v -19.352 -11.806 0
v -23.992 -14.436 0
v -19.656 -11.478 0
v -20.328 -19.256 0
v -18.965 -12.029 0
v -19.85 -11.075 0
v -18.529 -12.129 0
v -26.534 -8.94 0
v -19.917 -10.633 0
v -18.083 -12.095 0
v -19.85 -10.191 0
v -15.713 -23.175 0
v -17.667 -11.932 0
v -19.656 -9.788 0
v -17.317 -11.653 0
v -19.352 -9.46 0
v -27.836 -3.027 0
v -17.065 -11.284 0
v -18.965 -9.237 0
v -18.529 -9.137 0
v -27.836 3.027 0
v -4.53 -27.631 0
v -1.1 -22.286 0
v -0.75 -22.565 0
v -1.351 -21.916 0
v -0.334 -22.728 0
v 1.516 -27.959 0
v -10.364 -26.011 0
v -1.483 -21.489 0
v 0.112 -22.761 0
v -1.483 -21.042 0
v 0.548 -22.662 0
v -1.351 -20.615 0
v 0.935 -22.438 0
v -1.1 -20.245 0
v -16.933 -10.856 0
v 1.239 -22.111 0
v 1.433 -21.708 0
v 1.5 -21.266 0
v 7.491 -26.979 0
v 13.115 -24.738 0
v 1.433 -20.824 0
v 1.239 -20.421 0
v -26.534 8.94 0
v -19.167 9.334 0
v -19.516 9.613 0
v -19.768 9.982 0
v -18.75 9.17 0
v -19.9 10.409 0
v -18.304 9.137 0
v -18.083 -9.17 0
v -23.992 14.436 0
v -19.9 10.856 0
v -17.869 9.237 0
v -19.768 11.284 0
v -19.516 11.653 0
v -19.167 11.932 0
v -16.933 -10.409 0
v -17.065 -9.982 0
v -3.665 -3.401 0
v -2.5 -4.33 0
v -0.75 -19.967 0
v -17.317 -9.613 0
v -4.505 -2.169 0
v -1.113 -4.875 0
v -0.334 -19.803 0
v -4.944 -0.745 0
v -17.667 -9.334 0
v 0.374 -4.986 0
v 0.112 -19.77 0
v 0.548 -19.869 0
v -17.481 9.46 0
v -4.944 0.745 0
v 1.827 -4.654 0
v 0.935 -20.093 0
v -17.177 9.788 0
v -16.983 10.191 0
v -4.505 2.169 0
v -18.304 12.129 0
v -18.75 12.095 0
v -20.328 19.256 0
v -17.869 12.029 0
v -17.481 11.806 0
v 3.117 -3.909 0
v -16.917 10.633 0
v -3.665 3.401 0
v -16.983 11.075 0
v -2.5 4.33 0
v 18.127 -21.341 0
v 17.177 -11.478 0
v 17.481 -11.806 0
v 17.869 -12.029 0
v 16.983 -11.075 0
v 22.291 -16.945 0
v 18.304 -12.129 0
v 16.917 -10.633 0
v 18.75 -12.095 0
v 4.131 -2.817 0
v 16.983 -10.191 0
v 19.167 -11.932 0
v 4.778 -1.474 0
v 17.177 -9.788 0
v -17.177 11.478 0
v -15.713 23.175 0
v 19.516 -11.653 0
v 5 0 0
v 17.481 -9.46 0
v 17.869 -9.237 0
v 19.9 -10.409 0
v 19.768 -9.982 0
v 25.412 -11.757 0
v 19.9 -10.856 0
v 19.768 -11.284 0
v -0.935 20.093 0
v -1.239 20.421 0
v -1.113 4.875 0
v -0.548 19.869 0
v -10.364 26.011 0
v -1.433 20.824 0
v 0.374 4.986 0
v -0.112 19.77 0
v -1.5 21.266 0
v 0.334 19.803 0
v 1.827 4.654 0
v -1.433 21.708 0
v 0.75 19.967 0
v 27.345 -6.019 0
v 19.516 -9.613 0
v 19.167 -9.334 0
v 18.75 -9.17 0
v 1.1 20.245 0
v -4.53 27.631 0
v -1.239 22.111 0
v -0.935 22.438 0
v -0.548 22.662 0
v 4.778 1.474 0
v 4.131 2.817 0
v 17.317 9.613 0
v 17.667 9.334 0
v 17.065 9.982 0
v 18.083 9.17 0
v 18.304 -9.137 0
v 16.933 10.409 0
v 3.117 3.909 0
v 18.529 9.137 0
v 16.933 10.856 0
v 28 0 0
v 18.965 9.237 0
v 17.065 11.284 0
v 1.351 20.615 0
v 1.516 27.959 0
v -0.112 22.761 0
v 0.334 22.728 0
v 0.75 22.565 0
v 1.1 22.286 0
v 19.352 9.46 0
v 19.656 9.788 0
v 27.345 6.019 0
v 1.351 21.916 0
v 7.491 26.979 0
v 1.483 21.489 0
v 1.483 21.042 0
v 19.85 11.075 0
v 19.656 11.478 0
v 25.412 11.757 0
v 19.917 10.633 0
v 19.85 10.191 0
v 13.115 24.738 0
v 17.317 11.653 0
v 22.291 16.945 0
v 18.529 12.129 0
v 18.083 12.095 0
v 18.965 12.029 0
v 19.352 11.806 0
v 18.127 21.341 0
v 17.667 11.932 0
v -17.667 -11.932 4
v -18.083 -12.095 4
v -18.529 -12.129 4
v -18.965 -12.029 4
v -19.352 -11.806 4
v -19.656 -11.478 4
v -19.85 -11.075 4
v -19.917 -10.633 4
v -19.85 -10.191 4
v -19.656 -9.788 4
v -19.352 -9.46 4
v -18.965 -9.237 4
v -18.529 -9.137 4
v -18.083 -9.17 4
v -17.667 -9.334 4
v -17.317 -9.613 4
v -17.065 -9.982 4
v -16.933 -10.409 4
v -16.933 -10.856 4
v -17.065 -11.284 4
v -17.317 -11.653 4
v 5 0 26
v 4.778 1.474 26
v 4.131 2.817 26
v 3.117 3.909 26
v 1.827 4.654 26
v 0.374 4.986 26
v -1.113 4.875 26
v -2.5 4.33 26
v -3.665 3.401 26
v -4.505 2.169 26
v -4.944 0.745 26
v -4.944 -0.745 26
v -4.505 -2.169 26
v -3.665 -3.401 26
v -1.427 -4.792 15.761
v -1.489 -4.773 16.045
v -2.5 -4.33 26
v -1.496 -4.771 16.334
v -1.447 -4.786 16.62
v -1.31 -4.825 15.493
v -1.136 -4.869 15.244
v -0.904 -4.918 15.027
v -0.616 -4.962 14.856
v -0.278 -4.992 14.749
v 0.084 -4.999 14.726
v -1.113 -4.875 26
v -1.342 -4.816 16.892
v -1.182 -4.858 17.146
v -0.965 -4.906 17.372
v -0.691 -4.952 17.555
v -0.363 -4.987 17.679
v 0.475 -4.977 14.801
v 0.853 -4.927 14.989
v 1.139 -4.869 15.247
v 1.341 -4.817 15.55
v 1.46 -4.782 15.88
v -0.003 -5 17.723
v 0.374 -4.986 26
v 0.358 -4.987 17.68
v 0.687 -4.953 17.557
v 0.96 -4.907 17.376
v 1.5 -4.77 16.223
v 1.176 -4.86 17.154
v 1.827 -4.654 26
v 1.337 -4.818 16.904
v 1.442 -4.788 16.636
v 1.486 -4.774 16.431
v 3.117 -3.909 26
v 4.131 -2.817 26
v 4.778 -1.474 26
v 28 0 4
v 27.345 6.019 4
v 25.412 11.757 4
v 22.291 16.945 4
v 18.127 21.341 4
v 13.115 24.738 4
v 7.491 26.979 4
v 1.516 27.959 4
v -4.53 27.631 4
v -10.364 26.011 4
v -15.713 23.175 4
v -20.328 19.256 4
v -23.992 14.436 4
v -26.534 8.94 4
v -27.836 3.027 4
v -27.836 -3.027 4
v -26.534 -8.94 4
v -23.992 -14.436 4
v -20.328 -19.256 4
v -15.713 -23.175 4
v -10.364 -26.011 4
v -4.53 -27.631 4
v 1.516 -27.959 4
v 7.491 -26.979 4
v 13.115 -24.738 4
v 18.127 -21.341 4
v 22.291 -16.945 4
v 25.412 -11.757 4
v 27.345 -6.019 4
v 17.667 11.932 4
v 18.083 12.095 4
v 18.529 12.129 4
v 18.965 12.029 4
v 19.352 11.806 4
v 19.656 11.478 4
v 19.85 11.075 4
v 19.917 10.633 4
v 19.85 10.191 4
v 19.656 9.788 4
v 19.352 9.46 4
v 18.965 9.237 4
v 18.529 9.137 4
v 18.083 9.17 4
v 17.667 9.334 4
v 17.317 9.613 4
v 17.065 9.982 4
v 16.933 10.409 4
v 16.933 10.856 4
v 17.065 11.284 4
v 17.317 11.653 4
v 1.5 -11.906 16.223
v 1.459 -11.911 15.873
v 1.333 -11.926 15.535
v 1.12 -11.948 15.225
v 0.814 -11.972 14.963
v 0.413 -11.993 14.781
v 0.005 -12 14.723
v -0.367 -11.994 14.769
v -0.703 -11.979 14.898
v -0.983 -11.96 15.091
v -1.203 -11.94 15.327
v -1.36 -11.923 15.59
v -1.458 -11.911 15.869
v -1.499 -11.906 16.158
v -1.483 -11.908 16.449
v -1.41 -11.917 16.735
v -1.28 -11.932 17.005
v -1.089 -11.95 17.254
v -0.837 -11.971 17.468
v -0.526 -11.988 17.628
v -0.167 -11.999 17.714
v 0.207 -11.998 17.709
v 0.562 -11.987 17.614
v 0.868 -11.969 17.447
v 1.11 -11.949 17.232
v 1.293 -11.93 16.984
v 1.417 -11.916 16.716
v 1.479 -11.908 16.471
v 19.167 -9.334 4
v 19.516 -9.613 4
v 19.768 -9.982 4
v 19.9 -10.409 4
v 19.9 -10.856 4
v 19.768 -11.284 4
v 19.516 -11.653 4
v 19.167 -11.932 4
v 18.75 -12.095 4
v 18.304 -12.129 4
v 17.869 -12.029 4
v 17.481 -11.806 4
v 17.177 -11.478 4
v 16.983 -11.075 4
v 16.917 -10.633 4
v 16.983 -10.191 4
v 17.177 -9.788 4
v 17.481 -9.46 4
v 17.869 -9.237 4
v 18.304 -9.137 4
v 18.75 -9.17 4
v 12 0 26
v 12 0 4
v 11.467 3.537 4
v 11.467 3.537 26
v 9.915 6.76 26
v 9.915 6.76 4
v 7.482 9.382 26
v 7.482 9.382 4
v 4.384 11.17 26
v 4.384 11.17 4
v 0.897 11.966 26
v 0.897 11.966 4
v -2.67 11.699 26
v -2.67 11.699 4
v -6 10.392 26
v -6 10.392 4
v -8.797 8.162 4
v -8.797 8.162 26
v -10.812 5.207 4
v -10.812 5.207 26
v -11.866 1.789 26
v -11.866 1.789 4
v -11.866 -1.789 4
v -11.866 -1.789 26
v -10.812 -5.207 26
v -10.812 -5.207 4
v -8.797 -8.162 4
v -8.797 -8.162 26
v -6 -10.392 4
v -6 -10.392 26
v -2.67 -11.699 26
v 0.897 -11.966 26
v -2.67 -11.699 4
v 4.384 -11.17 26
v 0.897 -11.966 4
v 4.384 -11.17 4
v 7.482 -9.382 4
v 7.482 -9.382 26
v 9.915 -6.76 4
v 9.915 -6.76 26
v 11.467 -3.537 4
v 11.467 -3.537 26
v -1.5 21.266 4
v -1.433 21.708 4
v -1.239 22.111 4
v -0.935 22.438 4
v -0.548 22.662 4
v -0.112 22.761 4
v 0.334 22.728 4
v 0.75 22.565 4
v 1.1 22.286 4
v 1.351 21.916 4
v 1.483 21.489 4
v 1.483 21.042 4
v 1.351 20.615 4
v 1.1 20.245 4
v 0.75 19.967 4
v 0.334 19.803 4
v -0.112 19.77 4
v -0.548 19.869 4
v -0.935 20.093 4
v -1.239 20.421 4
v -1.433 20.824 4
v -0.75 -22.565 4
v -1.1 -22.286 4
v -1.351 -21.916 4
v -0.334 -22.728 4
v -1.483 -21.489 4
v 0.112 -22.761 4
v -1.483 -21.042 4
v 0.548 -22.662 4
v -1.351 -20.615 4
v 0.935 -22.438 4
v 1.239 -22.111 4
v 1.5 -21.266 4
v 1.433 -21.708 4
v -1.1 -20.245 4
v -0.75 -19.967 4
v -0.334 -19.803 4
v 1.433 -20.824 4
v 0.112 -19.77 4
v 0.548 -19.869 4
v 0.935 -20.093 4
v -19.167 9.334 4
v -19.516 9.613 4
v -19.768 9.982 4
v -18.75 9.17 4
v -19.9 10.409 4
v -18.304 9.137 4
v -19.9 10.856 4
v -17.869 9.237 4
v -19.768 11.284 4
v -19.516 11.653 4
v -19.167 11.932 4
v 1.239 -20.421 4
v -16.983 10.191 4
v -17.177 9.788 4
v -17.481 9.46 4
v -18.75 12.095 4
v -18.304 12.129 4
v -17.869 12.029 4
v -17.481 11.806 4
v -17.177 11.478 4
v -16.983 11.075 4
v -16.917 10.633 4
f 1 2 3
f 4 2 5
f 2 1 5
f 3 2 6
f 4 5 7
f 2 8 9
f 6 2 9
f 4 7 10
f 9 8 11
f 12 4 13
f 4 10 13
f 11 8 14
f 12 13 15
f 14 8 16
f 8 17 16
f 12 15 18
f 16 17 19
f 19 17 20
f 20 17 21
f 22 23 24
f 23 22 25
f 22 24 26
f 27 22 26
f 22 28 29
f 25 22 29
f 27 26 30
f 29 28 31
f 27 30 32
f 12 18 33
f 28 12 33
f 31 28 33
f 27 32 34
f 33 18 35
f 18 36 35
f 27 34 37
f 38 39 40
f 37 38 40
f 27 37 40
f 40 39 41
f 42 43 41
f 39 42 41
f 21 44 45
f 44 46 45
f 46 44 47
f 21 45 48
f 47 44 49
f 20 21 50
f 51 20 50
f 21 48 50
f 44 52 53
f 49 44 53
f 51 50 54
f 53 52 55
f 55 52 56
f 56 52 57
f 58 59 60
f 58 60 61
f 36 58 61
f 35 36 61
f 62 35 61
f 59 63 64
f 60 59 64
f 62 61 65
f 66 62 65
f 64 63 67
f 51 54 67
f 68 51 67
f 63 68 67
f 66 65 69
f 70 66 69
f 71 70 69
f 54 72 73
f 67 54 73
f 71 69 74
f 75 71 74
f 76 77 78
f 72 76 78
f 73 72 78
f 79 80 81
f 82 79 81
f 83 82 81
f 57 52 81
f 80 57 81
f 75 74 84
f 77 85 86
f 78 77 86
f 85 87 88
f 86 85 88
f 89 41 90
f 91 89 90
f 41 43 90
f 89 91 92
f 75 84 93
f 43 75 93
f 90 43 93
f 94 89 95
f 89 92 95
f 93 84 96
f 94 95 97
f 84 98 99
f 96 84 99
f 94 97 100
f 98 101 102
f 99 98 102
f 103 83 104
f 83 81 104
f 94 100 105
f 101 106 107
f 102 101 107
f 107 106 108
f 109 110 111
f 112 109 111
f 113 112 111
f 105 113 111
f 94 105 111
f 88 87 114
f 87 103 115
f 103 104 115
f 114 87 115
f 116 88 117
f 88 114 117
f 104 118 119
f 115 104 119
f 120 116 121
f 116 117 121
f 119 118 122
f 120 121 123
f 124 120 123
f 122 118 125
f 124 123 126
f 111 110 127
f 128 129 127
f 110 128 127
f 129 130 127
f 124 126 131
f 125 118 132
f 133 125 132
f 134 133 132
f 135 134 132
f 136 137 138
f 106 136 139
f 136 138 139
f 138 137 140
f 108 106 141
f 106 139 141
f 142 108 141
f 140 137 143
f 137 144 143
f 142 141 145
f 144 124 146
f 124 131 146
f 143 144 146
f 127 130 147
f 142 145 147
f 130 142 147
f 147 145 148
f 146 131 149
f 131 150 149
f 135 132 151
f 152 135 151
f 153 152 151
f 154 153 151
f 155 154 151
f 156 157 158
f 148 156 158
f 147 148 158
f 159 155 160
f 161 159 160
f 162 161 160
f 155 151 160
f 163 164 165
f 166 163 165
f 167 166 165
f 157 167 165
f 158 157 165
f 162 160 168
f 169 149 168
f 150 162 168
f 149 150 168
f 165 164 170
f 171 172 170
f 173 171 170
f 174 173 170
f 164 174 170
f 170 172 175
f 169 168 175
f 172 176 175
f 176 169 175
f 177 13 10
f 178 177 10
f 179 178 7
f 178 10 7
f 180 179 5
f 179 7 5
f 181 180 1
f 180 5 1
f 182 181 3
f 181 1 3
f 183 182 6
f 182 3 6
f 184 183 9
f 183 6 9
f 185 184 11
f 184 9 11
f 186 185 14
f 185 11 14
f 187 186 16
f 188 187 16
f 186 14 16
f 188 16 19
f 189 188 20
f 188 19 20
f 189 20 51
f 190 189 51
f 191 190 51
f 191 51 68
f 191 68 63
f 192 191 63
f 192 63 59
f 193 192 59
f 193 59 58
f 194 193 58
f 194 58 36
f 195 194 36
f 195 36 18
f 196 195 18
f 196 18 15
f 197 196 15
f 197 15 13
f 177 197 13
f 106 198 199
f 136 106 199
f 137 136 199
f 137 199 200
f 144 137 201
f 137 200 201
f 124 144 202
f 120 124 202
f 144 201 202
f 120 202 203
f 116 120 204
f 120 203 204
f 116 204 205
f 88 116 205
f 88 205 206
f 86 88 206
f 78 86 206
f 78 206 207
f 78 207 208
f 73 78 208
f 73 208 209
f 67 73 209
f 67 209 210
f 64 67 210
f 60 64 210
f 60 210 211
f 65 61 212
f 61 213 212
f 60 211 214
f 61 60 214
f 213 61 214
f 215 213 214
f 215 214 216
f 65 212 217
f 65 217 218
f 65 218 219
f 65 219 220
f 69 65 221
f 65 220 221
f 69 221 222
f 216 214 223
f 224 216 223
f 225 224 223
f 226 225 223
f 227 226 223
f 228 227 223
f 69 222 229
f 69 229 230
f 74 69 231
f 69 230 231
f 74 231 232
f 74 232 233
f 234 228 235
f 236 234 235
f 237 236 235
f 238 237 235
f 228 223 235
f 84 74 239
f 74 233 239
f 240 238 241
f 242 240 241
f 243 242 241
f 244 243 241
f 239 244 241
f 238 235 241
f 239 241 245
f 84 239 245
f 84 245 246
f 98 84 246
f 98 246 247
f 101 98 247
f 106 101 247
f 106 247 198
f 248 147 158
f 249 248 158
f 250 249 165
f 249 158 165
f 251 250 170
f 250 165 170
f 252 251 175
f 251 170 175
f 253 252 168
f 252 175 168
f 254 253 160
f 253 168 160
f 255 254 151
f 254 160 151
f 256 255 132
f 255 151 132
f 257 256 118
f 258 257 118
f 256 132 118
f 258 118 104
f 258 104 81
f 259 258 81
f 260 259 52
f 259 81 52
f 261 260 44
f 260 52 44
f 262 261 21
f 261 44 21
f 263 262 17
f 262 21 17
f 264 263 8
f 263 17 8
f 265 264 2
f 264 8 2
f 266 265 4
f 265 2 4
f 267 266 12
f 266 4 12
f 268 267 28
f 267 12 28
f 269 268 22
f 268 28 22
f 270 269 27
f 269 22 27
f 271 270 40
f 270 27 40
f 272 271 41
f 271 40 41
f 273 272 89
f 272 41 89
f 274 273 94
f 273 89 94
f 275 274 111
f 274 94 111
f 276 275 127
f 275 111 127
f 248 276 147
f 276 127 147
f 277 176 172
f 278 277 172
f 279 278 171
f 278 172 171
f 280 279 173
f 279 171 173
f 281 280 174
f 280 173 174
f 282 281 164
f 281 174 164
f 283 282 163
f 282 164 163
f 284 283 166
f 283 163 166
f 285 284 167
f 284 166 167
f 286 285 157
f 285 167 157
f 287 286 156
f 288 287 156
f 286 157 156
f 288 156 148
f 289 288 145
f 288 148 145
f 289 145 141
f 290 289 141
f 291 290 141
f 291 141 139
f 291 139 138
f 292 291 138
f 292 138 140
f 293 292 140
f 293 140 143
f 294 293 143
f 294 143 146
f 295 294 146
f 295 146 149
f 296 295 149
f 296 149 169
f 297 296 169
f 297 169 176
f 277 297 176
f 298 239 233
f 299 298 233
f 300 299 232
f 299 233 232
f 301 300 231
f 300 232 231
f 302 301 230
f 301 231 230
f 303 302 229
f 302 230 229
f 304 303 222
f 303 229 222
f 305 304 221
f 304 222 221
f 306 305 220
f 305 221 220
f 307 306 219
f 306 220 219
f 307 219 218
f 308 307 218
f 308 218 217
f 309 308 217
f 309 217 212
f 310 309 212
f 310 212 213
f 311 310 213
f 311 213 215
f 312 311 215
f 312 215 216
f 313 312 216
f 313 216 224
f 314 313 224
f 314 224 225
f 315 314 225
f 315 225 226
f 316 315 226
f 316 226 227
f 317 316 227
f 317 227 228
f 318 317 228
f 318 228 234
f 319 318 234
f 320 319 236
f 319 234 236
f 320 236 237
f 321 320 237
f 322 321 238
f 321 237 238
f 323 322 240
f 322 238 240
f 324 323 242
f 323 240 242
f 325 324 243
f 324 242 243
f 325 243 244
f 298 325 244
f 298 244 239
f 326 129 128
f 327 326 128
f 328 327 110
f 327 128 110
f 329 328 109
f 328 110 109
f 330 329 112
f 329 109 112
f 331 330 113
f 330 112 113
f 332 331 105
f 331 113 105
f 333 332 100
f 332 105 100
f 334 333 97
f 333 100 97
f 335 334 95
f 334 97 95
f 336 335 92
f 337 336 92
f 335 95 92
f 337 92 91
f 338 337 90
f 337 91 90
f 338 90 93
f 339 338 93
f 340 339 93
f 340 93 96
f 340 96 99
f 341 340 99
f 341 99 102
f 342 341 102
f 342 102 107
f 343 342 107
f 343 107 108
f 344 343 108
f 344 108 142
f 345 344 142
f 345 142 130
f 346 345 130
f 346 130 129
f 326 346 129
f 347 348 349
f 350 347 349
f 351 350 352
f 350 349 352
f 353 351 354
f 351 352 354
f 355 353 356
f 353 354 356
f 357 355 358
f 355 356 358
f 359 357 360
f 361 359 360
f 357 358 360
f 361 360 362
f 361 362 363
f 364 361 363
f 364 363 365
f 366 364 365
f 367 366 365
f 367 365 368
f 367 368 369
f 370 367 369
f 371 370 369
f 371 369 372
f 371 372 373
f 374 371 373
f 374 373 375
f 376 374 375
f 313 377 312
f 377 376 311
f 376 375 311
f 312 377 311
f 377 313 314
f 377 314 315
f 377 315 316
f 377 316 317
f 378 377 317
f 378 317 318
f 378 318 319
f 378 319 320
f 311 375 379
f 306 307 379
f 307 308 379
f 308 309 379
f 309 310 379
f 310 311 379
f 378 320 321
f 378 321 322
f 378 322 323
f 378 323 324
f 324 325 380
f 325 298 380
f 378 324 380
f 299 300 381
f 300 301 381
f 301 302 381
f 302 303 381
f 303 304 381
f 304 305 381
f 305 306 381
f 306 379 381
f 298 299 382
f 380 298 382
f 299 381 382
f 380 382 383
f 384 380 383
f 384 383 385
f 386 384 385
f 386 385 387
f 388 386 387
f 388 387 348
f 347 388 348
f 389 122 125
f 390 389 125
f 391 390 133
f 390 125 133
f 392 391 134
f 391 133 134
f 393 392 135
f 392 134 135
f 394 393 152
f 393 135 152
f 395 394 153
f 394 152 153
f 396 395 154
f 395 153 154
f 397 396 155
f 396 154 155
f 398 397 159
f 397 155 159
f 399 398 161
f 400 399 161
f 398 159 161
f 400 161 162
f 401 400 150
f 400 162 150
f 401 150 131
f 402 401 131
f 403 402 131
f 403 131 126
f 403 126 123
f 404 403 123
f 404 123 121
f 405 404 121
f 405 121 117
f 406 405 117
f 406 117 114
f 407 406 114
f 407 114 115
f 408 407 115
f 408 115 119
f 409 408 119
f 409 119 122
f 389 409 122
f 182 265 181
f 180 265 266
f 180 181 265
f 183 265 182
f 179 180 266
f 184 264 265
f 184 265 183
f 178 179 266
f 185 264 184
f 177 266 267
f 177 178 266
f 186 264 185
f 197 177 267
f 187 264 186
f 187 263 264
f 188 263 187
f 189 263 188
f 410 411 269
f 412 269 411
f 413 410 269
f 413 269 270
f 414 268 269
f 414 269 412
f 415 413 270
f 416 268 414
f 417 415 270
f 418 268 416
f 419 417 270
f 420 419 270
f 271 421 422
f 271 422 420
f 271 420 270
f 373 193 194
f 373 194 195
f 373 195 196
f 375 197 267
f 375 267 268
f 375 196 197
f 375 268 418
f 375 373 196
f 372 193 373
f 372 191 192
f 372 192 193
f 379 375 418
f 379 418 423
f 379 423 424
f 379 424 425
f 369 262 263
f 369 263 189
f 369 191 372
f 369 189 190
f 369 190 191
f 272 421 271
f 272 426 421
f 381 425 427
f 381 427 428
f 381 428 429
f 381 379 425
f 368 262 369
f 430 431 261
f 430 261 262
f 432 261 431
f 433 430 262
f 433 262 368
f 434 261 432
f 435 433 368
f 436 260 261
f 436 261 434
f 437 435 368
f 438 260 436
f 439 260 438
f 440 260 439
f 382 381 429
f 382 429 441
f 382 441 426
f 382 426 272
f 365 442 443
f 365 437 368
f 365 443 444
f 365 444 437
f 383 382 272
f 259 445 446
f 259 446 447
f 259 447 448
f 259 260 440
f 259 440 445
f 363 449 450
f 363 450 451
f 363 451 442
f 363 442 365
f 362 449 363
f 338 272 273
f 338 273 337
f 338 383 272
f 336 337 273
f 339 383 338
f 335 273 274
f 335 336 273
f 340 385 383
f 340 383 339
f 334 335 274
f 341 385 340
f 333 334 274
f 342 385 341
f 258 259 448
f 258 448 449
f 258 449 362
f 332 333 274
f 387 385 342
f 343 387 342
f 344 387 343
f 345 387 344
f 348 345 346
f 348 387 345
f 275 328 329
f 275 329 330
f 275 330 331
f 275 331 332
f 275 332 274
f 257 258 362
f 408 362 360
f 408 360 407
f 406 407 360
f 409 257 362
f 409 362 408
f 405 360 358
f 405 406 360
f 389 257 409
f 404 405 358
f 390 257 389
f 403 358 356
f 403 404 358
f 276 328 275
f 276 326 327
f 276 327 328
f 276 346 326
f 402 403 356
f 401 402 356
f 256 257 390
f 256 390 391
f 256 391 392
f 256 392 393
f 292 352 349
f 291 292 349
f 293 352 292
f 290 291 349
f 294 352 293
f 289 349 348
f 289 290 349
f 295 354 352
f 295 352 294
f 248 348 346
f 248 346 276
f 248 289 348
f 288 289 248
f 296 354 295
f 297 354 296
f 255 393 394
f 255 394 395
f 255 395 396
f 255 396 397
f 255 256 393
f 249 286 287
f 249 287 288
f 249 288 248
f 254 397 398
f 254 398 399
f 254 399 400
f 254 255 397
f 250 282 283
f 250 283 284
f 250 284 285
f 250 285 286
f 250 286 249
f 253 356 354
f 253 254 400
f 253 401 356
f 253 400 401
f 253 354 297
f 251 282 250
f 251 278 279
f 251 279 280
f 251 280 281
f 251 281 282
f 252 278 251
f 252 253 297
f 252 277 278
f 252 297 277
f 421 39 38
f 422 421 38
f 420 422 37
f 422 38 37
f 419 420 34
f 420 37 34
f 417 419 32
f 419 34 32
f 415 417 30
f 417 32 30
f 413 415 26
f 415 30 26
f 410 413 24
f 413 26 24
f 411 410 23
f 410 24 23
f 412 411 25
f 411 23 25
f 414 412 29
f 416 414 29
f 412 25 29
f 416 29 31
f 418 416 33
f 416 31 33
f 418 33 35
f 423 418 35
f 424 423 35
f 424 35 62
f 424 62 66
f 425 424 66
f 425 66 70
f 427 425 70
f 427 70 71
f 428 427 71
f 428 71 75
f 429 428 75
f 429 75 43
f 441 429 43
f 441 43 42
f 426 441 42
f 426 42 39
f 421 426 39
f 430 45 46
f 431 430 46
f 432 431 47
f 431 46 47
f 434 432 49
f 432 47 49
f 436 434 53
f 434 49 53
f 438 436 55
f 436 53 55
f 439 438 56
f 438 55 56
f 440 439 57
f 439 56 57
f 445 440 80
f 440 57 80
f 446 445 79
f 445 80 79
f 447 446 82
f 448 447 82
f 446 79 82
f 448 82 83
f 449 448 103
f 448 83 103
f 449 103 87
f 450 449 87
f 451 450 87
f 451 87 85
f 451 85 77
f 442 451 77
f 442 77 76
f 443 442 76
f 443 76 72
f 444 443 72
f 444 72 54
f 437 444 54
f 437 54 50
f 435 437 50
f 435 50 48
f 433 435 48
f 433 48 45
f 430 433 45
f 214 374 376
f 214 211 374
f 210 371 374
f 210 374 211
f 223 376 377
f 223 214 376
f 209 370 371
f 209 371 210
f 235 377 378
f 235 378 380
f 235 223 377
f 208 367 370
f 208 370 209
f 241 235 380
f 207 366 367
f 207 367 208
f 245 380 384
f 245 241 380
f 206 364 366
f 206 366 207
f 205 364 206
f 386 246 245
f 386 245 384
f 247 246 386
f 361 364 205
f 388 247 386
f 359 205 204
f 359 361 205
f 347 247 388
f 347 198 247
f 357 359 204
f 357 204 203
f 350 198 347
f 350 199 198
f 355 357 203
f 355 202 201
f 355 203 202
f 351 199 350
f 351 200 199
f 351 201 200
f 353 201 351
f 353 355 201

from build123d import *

# Parameters (mm, degrees)
SKETCH_1_R               = 28
EXTRUDE_1_DEPTH          = 4
SKETCH_2_R               = 12
EXTRUDE_2_DEPTH          = 22
SKETCH_3_R               = 5
CUT_EXTRUDE_1_DEPTH      = 60
SKETCH_4_R               = 1.5
CUT_EXTRUDE_2_DEPTH      = 7
PATTERN_CIRCULAR_1_COUNT = 6
SKETCH_5_R               = 1.5
CUT_EXTRUDE_3_DEPTH      = 15


with BuildPart() as part:
    # 草图1 → 凸台-拉伸1 (new body)
    with BuildSketch(Plane.XY):
        Circle(SKETCH_1_R)
    extrude(amount=EXTRUDE_1_DEPTH)

    # 草图2 → 凸台-拉伸2 (add)
    with BuildSketch(Plane.XY.offset(4)):
        Circle(SKETCH_2_R)
    extrude(amount=EXTRUDE_2_DEPTH)

    # 草图3 → 切除-拉伸1 (cut)
    with BuildSketch(Plane.XY.offset(26)):
        Circle(SKETCH_3_R)
    extrude(amount=-CUT_EXTRUDE_1_DEPTH, mode=Mode.SUBTRACT)

    # 草图4 → 切除-拉伸2 (cut)
    with BuildSketch(Plane(origin=(0, 0, 0), x_dir=(-1, 0, 0), z_dir=(0, 0, -1))):
        with Locations((0, 21.265645264)):
            Circle(SKETCH_4_R)
    cut_extrude_2 = extrude(amount=-CUT_EXTRUDE_2_DEPTH, mode=Mode.SUBTRACT)

    # 阵列(圆周)1: 切除-拉伸2 ×6 about axis
    pattern_circular_1_axis = Axis((0, 0, -1.3), (0, 0, 1))
    for i in range(1, PATTERN_CIRCULAR_1_COUNT):
        add(cut_extrude_2.rotate(pattern_circular_1_axis, i * 360 / PATTERN_CIRCULAR_1_COUNT), mode=Mode.SUBTRACT)

    # 草图5 → 切除-拉伸3 (cut)
    with BuildSketch(Plane(origin=(0, 0, 0), x_dir=(1, 0, 0), z_dir=(0, 1, 0))):
        with Locations((0, -16.223306721)):
            Circle(SKETCH_5_R)
    extrude(amount=-CUT_EXTRUDE_3_DEPTH, mode=Mode.SUBTRACT)


solid = part.part
